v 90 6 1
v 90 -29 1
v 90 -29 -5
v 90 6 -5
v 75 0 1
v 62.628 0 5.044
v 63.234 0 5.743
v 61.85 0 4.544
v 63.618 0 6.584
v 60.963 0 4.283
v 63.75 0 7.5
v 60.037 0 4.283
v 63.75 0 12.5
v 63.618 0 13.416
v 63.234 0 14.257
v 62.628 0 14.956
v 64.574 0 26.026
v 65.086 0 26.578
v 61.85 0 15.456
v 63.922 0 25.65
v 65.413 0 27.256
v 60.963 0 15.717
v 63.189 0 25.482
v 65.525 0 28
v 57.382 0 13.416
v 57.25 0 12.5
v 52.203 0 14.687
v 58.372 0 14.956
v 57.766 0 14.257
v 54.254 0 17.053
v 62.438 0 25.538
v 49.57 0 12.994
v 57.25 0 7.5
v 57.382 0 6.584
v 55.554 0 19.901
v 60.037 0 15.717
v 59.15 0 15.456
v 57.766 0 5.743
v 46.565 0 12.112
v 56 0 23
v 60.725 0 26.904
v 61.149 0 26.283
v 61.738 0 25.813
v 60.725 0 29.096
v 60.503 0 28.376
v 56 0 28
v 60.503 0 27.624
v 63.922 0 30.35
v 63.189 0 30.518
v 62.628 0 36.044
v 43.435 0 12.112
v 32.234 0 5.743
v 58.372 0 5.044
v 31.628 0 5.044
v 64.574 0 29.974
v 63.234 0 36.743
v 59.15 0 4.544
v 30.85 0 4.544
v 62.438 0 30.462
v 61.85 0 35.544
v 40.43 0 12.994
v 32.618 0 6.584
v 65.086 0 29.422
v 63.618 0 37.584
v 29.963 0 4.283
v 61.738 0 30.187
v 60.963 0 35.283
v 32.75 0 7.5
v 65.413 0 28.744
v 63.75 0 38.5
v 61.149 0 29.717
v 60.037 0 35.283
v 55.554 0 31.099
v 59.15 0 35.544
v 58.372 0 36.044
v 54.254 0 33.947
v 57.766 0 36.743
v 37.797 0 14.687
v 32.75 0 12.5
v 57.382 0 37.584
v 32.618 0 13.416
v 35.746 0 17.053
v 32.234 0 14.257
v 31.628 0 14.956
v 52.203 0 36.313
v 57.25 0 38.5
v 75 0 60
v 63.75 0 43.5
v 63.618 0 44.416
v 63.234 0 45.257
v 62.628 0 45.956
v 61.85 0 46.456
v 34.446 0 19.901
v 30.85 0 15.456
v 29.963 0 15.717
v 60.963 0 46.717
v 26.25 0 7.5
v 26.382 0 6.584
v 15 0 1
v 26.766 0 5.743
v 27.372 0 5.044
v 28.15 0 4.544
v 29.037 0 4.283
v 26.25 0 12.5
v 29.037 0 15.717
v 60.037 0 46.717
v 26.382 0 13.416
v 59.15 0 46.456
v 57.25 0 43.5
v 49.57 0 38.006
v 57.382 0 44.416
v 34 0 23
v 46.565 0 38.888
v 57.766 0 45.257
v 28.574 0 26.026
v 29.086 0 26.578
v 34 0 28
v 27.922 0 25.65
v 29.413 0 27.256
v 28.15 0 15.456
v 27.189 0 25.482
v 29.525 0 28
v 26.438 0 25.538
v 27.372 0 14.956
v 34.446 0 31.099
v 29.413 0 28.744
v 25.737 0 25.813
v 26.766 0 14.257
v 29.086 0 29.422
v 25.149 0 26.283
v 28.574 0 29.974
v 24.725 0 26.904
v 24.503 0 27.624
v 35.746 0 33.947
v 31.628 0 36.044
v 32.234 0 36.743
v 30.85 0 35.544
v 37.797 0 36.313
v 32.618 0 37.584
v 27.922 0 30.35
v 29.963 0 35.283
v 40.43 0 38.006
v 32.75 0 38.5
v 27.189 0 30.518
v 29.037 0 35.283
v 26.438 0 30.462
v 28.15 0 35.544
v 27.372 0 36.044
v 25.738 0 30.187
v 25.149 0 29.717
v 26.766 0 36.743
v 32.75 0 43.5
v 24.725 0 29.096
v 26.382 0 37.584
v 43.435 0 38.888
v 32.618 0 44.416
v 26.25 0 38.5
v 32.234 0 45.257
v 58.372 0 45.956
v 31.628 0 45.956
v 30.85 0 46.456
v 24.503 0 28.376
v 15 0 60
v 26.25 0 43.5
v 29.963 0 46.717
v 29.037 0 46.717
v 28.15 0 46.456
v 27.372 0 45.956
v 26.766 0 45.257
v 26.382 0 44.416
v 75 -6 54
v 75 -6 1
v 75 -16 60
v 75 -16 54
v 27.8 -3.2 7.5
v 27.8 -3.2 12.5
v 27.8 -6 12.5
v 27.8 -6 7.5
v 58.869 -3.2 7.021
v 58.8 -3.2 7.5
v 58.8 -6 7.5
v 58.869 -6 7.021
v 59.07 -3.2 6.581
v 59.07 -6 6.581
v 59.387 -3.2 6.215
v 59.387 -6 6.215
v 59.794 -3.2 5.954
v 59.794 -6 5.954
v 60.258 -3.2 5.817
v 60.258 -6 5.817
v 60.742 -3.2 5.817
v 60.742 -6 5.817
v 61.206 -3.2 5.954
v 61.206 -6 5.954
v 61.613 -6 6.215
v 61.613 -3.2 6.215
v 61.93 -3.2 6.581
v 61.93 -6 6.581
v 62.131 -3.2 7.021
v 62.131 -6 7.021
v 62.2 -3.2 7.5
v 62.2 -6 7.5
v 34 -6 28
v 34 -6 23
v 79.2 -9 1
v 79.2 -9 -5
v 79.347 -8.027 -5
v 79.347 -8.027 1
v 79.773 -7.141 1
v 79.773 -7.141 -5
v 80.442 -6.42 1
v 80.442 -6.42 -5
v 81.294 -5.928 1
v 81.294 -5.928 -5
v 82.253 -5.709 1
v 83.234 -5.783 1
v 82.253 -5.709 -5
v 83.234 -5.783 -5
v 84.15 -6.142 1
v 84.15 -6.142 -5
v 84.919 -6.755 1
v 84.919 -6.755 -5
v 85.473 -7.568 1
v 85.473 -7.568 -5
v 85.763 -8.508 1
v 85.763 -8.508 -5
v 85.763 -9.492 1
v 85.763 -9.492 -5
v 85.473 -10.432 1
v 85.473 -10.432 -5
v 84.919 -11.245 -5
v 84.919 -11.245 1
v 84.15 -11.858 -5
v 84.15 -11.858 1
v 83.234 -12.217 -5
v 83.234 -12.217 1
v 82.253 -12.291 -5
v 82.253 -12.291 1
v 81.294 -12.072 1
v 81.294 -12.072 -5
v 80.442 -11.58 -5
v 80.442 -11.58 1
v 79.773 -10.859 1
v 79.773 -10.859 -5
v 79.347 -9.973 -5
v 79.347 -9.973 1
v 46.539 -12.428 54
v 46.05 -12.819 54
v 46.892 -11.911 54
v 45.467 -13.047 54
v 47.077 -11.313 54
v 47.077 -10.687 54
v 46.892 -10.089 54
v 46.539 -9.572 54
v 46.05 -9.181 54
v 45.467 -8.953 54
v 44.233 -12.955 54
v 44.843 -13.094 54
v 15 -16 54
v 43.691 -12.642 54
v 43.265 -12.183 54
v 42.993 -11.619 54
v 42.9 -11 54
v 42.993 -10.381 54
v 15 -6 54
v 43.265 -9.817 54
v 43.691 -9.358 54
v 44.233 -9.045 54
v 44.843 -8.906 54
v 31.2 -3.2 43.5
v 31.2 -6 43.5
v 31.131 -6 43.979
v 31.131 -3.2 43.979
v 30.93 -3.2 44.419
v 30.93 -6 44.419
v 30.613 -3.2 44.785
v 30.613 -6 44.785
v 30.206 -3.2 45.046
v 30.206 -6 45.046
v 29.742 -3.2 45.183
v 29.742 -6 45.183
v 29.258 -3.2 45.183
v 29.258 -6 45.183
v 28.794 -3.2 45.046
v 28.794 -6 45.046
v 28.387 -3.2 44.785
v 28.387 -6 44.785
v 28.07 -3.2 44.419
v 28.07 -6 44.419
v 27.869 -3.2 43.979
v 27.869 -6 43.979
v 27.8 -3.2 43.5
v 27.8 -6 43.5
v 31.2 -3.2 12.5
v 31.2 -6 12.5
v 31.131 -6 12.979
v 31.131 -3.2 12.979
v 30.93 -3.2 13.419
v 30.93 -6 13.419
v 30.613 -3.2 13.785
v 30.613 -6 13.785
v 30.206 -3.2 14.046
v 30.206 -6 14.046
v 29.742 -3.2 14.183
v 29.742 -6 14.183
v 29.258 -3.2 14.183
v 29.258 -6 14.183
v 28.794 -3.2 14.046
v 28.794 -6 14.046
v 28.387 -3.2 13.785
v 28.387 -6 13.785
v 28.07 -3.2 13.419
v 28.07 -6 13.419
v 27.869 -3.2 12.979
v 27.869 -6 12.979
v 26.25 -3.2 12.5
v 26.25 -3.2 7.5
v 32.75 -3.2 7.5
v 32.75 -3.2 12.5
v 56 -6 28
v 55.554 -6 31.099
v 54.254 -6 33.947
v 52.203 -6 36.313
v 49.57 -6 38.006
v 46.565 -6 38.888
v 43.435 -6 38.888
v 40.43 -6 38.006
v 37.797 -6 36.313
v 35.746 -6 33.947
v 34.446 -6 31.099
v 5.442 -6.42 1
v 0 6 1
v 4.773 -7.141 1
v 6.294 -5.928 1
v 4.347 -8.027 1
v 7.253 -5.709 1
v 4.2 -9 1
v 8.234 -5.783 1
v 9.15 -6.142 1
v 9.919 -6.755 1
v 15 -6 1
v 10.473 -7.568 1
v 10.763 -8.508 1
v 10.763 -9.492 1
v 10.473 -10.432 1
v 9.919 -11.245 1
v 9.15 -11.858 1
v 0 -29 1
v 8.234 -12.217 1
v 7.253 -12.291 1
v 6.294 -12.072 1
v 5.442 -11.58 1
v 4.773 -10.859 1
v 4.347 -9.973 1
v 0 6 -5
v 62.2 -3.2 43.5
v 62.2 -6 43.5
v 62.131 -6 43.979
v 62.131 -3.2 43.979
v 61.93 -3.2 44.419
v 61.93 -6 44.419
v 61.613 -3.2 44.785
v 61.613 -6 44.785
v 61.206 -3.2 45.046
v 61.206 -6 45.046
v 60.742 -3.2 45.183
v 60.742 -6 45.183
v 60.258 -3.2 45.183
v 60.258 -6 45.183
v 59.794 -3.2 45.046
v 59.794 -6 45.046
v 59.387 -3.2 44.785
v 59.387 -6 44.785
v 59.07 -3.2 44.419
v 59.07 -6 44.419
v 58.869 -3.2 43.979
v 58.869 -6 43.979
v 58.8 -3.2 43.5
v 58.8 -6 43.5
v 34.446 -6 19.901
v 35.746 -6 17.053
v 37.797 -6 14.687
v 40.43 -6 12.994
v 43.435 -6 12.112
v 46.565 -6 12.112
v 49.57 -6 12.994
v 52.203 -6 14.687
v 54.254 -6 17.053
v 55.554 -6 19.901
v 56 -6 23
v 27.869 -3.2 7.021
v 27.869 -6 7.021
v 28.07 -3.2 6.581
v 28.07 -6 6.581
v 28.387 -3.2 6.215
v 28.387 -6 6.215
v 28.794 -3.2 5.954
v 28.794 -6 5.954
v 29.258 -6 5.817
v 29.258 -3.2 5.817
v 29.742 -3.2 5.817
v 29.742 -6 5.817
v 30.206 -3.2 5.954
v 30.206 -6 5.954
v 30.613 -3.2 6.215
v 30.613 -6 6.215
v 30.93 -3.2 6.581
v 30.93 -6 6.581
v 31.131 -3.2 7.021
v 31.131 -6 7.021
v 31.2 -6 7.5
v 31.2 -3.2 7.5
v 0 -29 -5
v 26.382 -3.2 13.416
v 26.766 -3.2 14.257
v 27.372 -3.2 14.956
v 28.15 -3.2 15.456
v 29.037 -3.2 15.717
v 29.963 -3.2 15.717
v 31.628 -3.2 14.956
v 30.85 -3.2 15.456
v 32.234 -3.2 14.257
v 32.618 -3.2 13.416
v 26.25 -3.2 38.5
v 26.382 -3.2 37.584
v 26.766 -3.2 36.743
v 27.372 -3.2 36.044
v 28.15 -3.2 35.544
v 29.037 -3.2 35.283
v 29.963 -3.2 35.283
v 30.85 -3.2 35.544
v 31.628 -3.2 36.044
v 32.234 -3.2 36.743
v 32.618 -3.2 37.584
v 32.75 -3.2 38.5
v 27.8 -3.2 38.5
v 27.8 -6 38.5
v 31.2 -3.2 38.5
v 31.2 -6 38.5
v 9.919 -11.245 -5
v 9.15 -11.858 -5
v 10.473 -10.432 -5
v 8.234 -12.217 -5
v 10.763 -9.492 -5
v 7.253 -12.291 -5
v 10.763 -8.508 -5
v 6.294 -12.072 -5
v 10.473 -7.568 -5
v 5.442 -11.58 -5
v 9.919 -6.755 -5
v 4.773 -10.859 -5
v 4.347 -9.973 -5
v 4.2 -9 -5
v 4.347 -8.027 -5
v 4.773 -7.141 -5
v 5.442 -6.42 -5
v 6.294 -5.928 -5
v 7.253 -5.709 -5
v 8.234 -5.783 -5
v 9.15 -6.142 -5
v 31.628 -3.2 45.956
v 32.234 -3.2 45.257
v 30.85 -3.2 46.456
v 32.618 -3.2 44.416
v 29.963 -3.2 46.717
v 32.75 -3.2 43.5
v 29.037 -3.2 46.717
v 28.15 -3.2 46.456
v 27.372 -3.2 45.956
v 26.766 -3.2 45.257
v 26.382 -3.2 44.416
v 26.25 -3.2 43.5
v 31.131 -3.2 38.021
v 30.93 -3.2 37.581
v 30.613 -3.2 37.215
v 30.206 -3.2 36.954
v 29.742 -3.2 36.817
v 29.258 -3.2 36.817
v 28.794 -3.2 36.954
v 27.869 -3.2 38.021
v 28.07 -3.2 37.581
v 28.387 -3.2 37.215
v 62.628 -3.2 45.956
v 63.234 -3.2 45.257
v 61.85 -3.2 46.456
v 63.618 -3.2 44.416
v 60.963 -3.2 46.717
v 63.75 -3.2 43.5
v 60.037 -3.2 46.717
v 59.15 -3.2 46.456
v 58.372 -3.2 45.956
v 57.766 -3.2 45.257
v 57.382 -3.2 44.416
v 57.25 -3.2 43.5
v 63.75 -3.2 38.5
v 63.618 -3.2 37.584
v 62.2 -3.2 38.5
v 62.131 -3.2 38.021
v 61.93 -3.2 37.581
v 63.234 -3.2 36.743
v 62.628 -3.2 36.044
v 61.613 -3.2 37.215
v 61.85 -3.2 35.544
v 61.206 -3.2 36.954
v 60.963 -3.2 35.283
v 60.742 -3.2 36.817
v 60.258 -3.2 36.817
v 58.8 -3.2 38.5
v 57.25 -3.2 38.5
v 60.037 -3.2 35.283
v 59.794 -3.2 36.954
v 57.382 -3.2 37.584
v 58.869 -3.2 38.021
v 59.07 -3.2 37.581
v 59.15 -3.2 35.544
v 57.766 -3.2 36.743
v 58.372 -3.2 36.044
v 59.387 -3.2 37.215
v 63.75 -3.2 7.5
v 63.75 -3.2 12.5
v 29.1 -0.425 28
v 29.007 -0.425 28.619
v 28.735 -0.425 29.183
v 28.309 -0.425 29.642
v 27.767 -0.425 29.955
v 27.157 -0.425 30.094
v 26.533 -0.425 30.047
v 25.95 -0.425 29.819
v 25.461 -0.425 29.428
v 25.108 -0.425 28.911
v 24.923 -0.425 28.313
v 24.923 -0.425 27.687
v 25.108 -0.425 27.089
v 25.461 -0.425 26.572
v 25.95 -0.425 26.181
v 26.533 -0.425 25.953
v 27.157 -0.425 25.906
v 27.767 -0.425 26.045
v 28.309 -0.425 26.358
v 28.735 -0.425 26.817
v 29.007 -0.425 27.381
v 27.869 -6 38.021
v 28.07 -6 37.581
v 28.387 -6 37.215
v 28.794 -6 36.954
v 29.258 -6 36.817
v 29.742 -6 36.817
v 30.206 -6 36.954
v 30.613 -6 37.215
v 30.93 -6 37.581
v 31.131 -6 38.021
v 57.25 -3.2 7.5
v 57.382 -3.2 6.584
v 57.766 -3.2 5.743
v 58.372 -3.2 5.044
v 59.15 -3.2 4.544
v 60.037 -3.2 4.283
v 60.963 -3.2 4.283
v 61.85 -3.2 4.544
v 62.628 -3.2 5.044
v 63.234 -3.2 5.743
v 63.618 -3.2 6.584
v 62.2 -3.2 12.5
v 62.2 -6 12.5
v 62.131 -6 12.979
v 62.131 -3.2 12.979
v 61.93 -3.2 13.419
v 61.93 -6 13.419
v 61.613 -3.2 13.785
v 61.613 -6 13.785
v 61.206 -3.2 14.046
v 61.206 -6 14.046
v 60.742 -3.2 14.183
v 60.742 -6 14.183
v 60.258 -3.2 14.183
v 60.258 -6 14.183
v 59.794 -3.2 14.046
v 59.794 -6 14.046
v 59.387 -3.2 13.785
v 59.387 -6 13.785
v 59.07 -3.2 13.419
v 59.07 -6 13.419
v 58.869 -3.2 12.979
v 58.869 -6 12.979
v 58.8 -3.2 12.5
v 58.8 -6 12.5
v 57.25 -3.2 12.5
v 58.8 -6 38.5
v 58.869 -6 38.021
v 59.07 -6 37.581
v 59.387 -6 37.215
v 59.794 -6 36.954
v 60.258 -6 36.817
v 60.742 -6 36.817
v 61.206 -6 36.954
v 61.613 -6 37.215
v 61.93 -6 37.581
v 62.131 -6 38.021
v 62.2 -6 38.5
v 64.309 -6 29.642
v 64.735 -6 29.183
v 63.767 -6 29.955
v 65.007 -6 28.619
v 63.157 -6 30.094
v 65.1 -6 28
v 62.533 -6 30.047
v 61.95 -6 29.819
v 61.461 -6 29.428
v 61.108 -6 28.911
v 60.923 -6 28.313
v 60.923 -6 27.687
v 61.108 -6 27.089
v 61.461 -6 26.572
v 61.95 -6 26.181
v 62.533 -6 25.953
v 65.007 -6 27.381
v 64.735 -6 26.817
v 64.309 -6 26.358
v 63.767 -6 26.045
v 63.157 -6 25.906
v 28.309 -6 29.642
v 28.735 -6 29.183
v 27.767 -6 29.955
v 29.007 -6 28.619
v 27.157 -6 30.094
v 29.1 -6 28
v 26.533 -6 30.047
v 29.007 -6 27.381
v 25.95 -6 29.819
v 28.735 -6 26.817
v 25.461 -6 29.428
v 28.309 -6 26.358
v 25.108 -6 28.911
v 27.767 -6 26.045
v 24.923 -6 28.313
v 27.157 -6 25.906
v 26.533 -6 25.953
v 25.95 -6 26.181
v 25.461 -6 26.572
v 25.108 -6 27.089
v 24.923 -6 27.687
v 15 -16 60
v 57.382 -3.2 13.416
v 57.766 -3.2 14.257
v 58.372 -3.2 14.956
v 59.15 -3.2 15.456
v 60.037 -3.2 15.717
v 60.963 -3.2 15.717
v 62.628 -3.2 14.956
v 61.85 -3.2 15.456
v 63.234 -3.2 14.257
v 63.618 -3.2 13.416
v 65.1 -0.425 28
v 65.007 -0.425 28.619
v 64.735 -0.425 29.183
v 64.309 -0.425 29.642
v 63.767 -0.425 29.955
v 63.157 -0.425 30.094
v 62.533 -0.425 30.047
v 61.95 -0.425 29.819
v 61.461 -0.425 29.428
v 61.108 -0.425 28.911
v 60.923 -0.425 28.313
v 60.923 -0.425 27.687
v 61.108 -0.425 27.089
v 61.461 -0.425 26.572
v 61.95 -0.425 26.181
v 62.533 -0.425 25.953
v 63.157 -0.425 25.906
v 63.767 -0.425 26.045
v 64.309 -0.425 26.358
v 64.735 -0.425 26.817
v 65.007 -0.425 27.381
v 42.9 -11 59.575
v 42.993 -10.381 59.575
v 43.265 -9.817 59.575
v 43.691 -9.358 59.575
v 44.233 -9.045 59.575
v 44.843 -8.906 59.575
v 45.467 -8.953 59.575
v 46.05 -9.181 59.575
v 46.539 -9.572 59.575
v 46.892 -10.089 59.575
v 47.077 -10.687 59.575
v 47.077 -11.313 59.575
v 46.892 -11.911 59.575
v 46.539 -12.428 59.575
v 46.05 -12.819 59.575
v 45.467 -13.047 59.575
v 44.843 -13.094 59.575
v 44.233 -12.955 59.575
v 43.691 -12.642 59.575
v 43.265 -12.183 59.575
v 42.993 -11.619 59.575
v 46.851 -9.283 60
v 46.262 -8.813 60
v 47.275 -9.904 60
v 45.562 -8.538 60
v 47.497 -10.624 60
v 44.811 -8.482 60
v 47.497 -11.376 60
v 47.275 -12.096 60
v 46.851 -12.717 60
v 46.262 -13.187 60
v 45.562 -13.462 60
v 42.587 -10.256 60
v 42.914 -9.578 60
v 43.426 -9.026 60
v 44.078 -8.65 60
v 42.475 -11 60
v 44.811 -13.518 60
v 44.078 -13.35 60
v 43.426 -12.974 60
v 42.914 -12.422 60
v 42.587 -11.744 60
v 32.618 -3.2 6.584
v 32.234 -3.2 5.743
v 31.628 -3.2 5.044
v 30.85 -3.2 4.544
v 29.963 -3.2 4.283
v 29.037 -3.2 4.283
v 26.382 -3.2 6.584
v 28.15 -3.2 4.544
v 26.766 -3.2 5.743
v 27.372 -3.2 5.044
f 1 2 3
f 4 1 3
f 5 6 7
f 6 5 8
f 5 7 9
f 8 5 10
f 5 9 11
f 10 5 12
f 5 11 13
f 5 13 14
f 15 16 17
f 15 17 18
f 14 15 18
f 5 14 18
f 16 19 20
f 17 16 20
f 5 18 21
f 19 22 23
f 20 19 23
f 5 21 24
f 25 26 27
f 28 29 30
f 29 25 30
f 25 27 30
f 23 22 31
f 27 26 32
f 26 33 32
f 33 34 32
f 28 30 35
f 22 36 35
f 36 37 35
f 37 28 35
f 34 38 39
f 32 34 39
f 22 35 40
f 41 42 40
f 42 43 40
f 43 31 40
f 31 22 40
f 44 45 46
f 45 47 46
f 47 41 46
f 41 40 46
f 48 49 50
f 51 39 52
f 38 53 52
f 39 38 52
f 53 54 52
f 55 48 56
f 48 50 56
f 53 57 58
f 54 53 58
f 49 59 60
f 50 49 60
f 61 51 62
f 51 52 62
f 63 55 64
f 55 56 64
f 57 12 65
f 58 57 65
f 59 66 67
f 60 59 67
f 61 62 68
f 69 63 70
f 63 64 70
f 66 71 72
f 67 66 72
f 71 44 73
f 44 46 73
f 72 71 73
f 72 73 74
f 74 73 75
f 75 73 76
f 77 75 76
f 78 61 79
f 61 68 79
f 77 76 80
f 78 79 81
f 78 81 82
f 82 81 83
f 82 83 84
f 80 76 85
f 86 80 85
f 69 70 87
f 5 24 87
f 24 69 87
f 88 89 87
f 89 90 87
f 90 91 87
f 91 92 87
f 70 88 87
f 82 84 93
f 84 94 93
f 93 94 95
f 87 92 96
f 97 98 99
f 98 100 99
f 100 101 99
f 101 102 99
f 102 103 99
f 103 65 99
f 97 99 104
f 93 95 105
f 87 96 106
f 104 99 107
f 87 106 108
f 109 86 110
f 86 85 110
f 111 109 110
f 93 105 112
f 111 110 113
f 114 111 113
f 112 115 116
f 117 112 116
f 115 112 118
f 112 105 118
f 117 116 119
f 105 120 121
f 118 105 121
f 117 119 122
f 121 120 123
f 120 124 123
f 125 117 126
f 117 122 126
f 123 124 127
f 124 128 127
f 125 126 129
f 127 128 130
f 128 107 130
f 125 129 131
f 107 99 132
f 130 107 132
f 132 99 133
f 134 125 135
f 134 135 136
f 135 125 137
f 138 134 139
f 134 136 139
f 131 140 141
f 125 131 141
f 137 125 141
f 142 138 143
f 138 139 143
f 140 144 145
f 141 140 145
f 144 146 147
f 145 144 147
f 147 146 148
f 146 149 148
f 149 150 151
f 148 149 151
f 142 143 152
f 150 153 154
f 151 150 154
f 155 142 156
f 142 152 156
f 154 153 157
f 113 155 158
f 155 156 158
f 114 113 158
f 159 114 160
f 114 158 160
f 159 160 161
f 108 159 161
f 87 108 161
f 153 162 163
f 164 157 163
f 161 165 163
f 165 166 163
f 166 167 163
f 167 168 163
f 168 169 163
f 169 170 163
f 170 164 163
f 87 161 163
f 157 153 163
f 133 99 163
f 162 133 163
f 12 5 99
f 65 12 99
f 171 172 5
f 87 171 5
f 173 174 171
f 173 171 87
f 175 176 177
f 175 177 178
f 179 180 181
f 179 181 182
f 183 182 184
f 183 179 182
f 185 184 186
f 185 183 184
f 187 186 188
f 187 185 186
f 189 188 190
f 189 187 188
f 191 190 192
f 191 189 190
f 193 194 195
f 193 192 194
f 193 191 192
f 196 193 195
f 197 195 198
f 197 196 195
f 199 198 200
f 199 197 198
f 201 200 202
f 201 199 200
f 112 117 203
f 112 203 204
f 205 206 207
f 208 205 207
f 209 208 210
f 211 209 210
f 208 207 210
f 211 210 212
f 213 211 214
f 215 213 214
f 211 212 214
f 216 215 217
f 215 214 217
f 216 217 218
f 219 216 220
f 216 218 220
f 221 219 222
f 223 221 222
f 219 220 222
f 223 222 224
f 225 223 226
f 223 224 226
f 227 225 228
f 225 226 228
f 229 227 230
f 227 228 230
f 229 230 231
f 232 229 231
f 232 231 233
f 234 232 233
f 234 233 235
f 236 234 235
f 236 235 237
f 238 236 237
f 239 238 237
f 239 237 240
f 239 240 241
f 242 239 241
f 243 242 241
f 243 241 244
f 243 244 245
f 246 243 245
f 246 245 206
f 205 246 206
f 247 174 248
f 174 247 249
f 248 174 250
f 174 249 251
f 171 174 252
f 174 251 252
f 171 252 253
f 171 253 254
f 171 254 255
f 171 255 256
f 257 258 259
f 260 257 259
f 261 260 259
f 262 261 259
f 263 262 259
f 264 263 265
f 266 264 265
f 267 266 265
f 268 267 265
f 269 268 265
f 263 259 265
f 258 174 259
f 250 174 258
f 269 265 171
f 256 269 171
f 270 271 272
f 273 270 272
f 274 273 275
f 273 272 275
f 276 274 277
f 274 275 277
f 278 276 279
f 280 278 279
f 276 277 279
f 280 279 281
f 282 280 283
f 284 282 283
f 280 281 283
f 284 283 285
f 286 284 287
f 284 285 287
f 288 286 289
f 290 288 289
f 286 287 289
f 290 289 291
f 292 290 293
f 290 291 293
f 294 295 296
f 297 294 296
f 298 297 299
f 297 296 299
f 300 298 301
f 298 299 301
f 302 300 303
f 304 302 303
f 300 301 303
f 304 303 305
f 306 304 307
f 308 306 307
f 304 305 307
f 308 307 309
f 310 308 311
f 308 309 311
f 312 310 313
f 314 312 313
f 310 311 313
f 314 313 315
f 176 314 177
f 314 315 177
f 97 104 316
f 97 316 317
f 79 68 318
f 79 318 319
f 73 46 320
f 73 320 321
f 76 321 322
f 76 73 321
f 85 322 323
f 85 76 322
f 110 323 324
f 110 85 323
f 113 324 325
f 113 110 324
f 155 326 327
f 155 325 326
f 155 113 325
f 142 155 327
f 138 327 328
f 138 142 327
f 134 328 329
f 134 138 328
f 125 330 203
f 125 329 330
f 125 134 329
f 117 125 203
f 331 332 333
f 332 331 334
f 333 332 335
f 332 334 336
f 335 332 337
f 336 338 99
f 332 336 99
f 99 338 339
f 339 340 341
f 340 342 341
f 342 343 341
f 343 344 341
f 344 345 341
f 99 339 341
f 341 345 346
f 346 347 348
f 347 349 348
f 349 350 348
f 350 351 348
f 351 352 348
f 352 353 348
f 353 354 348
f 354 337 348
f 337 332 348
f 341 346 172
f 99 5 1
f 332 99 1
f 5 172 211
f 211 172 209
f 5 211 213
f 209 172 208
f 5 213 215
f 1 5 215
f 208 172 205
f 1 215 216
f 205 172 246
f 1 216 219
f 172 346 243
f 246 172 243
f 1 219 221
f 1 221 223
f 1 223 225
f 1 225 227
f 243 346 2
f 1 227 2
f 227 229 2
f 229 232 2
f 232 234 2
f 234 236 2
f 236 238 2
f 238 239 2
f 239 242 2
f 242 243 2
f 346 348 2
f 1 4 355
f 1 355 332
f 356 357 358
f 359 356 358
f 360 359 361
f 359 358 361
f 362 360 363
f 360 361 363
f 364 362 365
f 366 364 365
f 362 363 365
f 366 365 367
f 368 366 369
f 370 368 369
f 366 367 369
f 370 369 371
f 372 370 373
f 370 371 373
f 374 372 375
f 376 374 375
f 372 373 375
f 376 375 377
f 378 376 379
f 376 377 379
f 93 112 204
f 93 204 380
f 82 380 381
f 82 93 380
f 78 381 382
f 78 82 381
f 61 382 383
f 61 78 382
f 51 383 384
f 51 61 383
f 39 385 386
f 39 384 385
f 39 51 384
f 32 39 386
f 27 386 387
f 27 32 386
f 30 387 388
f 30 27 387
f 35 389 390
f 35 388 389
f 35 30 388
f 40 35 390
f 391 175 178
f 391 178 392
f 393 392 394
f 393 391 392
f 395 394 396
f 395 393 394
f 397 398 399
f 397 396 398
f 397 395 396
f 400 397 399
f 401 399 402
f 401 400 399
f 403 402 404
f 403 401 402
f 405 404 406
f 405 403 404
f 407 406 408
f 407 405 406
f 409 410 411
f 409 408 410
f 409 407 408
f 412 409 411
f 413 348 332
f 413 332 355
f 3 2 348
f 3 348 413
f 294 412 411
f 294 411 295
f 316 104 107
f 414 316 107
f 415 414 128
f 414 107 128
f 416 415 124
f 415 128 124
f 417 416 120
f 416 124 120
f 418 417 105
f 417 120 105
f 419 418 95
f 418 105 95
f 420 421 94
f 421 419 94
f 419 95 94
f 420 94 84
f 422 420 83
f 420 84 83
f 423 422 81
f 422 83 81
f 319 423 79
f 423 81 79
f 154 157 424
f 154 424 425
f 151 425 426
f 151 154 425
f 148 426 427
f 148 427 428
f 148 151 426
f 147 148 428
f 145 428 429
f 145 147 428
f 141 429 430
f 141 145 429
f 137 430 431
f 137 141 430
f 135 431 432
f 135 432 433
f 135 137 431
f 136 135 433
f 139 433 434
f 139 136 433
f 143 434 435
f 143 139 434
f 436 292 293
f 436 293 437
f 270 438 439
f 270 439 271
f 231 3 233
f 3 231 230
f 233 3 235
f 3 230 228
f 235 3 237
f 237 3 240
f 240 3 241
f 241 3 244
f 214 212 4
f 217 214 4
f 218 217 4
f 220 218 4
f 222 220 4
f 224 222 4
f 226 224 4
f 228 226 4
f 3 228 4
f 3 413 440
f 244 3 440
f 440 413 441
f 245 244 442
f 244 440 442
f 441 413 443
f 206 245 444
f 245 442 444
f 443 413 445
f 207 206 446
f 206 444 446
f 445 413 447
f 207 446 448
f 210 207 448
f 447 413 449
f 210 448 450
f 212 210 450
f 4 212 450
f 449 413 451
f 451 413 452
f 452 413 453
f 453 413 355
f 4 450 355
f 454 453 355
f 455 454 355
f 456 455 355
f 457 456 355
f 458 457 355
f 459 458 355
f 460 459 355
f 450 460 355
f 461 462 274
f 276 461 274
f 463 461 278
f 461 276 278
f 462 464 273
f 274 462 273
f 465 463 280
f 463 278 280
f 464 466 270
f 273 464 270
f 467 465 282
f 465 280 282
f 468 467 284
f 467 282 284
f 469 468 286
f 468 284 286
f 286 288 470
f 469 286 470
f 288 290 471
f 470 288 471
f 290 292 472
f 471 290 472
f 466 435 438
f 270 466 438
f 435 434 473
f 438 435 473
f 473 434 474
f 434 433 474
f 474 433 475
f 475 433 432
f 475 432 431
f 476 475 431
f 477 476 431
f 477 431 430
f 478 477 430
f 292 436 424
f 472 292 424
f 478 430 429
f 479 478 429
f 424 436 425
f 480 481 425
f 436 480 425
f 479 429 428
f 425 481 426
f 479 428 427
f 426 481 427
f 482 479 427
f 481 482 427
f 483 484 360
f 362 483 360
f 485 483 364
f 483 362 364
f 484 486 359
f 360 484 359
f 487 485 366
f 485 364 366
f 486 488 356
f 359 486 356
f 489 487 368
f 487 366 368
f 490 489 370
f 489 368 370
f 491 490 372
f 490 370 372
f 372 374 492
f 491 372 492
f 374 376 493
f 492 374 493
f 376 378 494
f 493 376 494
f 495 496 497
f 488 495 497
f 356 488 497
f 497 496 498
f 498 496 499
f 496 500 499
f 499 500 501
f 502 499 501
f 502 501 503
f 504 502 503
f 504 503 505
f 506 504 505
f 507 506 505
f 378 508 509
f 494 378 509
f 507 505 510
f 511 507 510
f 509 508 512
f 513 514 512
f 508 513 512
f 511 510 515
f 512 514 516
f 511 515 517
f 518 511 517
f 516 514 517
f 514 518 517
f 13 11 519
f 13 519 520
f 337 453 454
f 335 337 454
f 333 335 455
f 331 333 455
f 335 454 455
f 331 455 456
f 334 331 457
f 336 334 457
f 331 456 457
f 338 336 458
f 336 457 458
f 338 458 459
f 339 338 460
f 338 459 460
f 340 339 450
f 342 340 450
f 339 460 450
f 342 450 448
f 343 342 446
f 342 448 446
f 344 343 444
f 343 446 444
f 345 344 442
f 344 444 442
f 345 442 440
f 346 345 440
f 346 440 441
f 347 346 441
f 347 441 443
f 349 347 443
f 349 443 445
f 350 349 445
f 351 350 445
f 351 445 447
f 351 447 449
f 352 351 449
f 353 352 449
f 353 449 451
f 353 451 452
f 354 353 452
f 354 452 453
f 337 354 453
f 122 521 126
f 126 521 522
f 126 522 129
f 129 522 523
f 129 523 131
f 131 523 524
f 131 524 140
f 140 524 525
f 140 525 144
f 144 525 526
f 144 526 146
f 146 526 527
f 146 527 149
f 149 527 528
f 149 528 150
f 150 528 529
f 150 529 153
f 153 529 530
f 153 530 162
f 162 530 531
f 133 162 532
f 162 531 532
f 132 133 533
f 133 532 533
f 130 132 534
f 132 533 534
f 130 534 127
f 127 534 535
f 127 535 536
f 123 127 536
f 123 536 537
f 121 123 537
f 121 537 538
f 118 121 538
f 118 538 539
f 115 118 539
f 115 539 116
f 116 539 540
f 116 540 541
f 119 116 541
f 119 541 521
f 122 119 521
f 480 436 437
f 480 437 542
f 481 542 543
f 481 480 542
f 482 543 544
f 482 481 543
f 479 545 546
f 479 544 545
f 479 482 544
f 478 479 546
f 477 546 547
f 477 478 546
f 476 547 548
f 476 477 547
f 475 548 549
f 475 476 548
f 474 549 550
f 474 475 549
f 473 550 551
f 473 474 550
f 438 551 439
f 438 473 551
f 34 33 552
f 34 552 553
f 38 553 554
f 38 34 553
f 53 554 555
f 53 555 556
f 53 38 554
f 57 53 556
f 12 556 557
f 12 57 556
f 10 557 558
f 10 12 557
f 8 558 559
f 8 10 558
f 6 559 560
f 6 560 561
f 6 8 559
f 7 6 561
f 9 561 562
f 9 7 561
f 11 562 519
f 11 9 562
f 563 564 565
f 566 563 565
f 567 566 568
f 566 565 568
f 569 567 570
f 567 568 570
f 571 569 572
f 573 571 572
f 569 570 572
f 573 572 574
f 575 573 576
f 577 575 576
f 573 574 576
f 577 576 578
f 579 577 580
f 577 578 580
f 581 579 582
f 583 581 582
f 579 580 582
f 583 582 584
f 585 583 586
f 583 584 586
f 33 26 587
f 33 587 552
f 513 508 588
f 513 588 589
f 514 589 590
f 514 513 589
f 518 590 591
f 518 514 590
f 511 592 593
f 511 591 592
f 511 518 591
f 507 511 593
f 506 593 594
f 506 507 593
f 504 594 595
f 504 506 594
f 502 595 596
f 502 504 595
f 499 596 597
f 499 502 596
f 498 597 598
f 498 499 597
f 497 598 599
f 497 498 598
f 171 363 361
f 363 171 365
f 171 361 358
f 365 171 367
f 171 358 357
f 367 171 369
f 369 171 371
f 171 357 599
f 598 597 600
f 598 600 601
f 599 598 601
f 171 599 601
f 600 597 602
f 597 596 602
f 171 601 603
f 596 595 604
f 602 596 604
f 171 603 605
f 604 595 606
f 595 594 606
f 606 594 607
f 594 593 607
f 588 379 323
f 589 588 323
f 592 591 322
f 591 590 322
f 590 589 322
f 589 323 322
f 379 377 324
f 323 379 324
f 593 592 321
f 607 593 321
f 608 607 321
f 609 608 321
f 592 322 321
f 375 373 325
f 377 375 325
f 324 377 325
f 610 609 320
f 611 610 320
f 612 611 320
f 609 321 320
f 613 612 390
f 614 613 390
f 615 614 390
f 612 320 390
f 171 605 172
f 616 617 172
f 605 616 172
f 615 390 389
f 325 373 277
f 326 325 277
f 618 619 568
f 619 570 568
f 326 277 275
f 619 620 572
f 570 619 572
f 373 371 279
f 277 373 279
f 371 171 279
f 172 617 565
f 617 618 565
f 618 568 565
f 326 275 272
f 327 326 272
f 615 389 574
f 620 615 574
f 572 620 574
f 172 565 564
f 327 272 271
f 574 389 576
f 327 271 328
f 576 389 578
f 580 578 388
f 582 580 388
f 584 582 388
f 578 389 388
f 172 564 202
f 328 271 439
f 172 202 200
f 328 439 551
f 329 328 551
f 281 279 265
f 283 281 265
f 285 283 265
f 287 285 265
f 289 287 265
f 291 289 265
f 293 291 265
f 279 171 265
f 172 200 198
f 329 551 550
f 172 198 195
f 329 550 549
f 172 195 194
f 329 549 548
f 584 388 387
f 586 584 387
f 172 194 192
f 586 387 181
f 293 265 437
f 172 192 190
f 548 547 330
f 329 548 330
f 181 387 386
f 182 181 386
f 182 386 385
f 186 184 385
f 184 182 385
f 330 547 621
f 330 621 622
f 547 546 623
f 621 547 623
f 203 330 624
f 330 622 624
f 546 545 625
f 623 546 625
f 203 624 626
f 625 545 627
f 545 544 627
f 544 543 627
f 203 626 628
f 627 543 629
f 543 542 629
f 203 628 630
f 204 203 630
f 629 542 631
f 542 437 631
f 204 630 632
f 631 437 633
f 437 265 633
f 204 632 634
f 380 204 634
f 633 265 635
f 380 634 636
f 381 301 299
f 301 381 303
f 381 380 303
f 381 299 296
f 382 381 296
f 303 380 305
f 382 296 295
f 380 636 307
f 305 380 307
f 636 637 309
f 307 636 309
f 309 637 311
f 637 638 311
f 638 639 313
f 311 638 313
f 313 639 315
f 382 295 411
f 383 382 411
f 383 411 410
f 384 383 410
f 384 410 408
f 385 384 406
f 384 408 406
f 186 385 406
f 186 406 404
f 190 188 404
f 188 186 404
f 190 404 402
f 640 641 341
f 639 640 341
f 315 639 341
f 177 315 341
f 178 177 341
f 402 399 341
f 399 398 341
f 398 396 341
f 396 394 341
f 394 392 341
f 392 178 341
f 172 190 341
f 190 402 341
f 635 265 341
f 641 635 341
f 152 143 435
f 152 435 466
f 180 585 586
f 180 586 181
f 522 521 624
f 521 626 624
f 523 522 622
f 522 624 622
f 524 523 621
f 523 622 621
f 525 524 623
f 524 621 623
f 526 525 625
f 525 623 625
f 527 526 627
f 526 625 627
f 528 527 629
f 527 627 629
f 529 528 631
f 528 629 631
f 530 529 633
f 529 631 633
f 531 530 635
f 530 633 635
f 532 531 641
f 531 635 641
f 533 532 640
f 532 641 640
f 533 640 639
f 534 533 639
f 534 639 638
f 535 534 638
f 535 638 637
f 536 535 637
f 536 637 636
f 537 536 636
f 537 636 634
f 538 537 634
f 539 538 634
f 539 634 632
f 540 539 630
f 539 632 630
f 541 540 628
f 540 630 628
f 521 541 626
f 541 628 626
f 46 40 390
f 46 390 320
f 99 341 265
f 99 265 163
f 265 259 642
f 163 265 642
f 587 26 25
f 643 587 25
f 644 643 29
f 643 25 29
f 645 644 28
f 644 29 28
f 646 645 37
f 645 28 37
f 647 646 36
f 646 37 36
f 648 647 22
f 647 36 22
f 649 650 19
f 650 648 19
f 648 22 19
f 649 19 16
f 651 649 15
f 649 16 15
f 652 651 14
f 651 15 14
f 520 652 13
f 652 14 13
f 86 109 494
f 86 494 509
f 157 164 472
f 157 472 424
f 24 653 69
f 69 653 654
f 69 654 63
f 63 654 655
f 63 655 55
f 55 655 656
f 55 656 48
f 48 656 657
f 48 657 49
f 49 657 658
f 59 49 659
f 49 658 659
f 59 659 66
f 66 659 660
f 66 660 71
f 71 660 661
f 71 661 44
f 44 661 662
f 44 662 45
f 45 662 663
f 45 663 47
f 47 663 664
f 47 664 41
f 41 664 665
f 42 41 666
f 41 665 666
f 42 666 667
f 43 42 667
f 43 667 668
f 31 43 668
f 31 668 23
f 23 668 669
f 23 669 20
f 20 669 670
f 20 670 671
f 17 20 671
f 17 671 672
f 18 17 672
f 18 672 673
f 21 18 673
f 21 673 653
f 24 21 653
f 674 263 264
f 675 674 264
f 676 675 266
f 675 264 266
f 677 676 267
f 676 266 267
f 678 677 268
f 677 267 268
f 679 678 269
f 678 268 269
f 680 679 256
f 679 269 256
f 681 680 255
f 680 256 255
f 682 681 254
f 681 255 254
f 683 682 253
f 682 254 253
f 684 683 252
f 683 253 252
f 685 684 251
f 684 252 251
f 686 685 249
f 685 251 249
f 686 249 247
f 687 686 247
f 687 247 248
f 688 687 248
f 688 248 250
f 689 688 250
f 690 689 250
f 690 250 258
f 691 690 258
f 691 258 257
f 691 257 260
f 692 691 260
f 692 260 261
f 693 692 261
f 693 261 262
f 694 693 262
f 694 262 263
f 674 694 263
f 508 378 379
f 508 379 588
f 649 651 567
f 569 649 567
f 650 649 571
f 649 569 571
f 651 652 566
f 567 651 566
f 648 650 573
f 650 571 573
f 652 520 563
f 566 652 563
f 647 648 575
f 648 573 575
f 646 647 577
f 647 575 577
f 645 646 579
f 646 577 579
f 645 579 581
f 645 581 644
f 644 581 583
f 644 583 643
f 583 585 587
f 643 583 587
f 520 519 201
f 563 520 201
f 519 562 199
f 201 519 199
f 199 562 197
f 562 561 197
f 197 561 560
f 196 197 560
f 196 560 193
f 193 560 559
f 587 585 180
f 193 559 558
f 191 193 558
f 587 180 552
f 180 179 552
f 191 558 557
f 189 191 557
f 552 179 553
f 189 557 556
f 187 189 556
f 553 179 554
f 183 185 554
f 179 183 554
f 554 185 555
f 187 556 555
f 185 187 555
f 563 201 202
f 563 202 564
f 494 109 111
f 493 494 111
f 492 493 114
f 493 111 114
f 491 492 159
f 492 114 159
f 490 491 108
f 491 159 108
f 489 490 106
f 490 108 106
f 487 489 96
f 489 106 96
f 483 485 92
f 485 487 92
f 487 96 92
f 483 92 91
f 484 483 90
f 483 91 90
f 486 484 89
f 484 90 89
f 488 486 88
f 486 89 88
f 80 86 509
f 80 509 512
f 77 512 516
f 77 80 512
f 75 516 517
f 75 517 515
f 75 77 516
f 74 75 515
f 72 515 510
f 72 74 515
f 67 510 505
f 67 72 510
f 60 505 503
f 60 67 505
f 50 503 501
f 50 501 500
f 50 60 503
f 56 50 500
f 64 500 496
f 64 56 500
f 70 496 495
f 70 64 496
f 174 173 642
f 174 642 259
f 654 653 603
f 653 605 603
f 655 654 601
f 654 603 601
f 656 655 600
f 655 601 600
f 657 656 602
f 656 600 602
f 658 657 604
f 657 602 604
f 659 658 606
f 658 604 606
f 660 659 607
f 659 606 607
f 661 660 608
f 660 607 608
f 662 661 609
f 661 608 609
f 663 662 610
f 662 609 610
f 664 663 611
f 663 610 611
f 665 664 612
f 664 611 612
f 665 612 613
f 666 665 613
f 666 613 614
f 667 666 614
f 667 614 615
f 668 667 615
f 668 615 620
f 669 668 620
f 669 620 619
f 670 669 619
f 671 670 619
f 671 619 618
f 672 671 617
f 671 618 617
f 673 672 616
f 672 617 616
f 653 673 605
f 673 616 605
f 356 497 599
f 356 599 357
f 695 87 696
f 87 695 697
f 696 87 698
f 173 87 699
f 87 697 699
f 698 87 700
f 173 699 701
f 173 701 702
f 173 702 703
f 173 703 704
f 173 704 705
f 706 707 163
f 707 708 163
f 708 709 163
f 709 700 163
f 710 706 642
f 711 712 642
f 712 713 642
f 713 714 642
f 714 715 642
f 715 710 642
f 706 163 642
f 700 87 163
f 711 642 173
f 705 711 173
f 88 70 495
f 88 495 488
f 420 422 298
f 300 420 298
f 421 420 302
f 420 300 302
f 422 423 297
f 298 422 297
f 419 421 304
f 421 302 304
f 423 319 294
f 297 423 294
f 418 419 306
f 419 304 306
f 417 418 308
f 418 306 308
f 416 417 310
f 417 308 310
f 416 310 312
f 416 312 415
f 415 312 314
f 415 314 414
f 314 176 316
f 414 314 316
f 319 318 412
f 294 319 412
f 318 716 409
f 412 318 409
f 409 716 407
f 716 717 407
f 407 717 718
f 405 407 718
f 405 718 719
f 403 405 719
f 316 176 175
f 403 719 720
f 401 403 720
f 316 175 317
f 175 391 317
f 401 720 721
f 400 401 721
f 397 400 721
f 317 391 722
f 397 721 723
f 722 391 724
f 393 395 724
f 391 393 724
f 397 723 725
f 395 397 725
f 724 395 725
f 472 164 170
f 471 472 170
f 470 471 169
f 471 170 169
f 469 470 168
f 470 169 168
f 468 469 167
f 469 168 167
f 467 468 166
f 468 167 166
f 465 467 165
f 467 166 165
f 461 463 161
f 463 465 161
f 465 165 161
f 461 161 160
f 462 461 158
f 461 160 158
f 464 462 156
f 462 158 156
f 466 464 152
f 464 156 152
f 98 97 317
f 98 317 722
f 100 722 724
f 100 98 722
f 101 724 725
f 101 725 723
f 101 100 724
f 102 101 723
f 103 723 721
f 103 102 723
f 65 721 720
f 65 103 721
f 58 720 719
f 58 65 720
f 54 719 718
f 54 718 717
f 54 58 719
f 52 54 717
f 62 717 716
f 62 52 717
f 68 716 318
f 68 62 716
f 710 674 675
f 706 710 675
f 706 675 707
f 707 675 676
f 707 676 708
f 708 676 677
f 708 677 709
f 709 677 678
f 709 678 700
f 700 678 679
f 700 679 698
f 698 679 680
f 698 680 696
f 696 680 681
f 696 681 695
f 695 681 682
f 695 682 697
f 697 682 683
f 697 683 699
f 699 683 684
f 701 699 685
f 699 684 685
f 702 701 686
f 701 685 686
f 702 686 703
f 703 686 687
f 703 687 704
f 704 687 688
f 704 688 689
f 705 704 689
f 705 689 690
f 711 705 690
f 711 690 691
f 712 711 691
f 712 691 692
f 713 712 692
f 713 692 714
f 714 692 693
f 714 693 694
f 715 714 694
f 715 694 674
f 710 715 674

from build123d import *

# Parameters (mm, degrees)
BOSS_EXTRUDE1_DEPTH                                 = 90
SKETCH3_W                                           = 15
SKETCH3_H                                           = 59
CUT_EXTRUDE1_DEPTH                                  = 111.381157812
M6_CLEARANCE_HOLE1_D                                = 6.6
M5_TAPPED_HOLE1_D                                   = 4.2
M5_TAPPED_HOLE1_DEPTH                               = 6
M5_TAPPED_HOLE1_CSINK_D                             = 5.05
M5_TAPPED_HOLE1_CSINK_ANGLE                         = 90
CUT_EXTRUDE2_DEPTH                                  = 112.986606342
M5_TAPPED_HOLE2_D                                   = 4.2
M5_TAPPED_HOLE2_CSINK_D                             = 5.05
M5_TAPPED_HOLE2_CSINK_ANGLE                         = 90
CBORE_FOR_M3_HEX_SOCKET_HEAD_CAP_SCREW1_D           = 3.4
CBORE_FOR_M3_HEX_SOCKET_HEAD_CAP_SCREW1_CBORE_D     = 6.5
CBORE_FOR_M3_HEX_SOCKET_HEAD_CAP_SCREW1_CBORE_DEPTH = 3
CUT_EXTRUDE3_DEPTH                                  = 112.986606342
CUT_EXTRUDE4_DEPTH                                  = 3.2


with BuildPart() as part:
    # Sketch1 → Boss-Extrude1 (new body)
    with BuildSketch(Plane(origin=(0, 0, 0), x_dir=(0, 0, -1), z_dir=(1, 0, 0))):
        Polygon((-60, 0), (-60, -16), (-54, -16), (-54, -6), (-1, -6), (-1, -29), (5, -29), (5, 6), (-1, 6), (-1, 0), align=None)
    extrude(amount=BOSS_EXTRUDE1_DEPTH)

    # Sketch3 → Cut-Extrude1 (cut, through all)
    with BuildSketch(Plane.XZ.offset(16)):
        with Locations((82.5, 30.5)):
            Rectangle(SKETCH3_W, SKETCH3_H)
        with Locations((7.5, 30.5)):
            Rectangle(SKETCH3_W, SKETCH3_H)
    extrude(amount=-CUT_EXTRUDE1_DEPTH, mode=Mode.SUBTRACT)

    # M6 Clearance Hole1 (through all)
    with Locations(Plane.XY.offset(1)):
        with Locations((7.5, -9), (82.5, -9)):
            Hole(M6_CLEARANCE_HOLE1_D / 2)

    # M5 Tapped Hole1
    with Locations(Plane.XY.offset(60)):
        with Locations((45, -11)):
            CounterSinkHole(M5_TAPPED_HOLE1_D / 2, M5_TAPPED_HOLE1_CSINK_D / 2, depth=M5_TAPPED_HOLE1_DEPTH, counter_sink_angle=M5_TAPPED_HOLE1_CSINK_ANGLE)

    # Sketch9 → Cut-Extrude2 (cut, through all)
    with BuildSketch(Plane(origin=(0, 0, 0), x_dir=(1, 0, 0), z_dir=(0, 1, 0))):
        with BuildLine():
            Line((34, -28), (34, -23))
            ThreePointArc((34, -23), (45, -12), (56, -23))
            Line((56, -23), (56, -28))
            ThreePointArc((56, -28), (45, -39), (34, -28))
        make_face()
    extrude(amount=-CUT_EXTRUDE2_DEPTH, mode=Mode.SUBTRACT)

    # M5 Tapped Hole2 (through all)
    with Locations(Plane(origin=(0, 0, 0), x_dir=(-1, 0, 0), z_dir=(0, 1, 0))):
        with Locations((-27, 28), (-63, 28)):
            CounterSinkHole(M5_TAPPED_HOLE2_D / 2, M5_TAPPED_HOLE2_CSINK_D / 2, counter_sink_angle=M5_TAPPED_HOLE2_CSINK_ANGLE)

    # CBORE for M3 Hex Socket Head Cap Screw1 (through all)
    with Locations(Plane(origin=(0, 0, 0), x_dir=(-1, 0, 0), z_dir=(0, 1, 0))):
        with Locations((-29.5, 12.5), (-60.5, 12.5), (-29.5, 43.5), (-60.5, 43.5)):
            CounterBoreHole(CBORE_FOR_M3_HEX_SOCKET_HEAD_CAP_SCREW1_D / 2, CBORE_FOR_M3_HEX_SOCKET_HEAD_CAP_SCREW1_CBORE_D / 2, CBORE_FOR_M3_HEX_SOCKET_HEAD_CAP_SCREW1_CBORE_DEPTH)

    # Sketch15 → Cut-Extrude3 (cut, through all)
    with BuildSketch(Plane(origin=(0, 0, 0), x_dir=(1, 0, 0), z_dir=(0, 1, 0))):
        with BuildLine():
            Line((27.8, -12.5), (27.8, -7.5))
            ThreePointArc((27.8, -7.5), (29.5, -5.8), (31.2, -7.5))
            Line((31.2, -7.5), (31.2, -12.5))
            ThreePointArc((31.2, -12.5), (29.5, -14.2), (27.8, -12.5))
        make_face()
        with BuildLine():
            Line((58.8, -12.5), (58.8, -7.5))
            ThreePointArc((58.8, -7.5), (60.5, -5.8), (62.2, -7.5))
            Line((62.2, -7.5), (62.2, -12.5))
            ThreePointArc((62.2, -12.5), (60.5, -14.2), (58.8, -12.5))
        make_face()
        with BuildLine():
            Line((27.8, -43.5), (27.8, -38.5))
            ThreePointArc((27.8, -38.5), (29.5, -36.8), (31.2, -38.5))
            Line((31.2, -38.5), (31.2, -43.5))
            ThreePointArc((31.2, -43.5), (29.5, -45.2), (27.8, -43.5))
        make_face()
        with BuildLine():
            Line((58.8, -43.5), (58.8, -38.5))
            ThreePointArc((58.8, -38.5), (60.5, -36.8), (62.2, -38.5))
            Line((62.2, -38.5), (62.2, -43.5))
            ThreePointArc((62.2, -43.5), (60.5, -45.2), (58.8, -43.5))
        make_face()
    extrude(amount=-CUT_EXTRUDE3_DEPTH, mode=Mode.SUBTRACT)

    # Sketch16 → Cut-Extrude4 (cut)
    with BuildSketch(Plane(origin=(0, 0, 0), x_dir=(1, 0, 0), z_dir=(0, 1, 0))):
        with BuildLine():
            Line((26.25, -12.5), (26.25, -7.5))
            ThreePointArc((26.25, -7.5), (29.5, -4.25), (32.75, -7.5))
            Line((32.75, -7.5), (32.75, -12.5))
            ThreePointArc((32.75, -12.5), (29.5, -15.75), (26.25, -12.5))
        make_face()
        with BuildLine():
            Line((57.25, -12.5), (57.25, -7.5))
            ThreePointArc((57.25, -7.5), (60.5, -4.25), (63.75, -7.5))
            Line((63.75, -7.5), (63.75, -12.5))
            ThreePointArc((63.75, -12.5), (60.5, -15.75), (57.25, -12.5))
        make_face()
        with BuildLine():
            Line((26.25, -43.5), (26.25, -38.5))
            ThreePointArc((26.25, -38.5), (29.5, -35.25), (32.75, -38.5))
            Line((32.75, -38.5), (32.75, -43.5))
            ThreePointArc((32.75, -43.5), (29.5, -46.75), (26.25, -43.5))
        make_face()
        with BuildLine():
            Line((57.25, -43.5), (57.25, -38.5))
            ThreePointArc((57.25, -38.5), (60.5, -35.25), (63.75, -38.5))
            Line((63.75, -38.5), (63.75, -43.5))
            ThreePointArc((63.75, -43.5), (60.5, -46.75), (57.25, -43.5))
        make_face()
    extrude(amount=-CUT_EXTRUDE4_DEPTH, mode=Mode.SUBTRACT)


solid = part.part
